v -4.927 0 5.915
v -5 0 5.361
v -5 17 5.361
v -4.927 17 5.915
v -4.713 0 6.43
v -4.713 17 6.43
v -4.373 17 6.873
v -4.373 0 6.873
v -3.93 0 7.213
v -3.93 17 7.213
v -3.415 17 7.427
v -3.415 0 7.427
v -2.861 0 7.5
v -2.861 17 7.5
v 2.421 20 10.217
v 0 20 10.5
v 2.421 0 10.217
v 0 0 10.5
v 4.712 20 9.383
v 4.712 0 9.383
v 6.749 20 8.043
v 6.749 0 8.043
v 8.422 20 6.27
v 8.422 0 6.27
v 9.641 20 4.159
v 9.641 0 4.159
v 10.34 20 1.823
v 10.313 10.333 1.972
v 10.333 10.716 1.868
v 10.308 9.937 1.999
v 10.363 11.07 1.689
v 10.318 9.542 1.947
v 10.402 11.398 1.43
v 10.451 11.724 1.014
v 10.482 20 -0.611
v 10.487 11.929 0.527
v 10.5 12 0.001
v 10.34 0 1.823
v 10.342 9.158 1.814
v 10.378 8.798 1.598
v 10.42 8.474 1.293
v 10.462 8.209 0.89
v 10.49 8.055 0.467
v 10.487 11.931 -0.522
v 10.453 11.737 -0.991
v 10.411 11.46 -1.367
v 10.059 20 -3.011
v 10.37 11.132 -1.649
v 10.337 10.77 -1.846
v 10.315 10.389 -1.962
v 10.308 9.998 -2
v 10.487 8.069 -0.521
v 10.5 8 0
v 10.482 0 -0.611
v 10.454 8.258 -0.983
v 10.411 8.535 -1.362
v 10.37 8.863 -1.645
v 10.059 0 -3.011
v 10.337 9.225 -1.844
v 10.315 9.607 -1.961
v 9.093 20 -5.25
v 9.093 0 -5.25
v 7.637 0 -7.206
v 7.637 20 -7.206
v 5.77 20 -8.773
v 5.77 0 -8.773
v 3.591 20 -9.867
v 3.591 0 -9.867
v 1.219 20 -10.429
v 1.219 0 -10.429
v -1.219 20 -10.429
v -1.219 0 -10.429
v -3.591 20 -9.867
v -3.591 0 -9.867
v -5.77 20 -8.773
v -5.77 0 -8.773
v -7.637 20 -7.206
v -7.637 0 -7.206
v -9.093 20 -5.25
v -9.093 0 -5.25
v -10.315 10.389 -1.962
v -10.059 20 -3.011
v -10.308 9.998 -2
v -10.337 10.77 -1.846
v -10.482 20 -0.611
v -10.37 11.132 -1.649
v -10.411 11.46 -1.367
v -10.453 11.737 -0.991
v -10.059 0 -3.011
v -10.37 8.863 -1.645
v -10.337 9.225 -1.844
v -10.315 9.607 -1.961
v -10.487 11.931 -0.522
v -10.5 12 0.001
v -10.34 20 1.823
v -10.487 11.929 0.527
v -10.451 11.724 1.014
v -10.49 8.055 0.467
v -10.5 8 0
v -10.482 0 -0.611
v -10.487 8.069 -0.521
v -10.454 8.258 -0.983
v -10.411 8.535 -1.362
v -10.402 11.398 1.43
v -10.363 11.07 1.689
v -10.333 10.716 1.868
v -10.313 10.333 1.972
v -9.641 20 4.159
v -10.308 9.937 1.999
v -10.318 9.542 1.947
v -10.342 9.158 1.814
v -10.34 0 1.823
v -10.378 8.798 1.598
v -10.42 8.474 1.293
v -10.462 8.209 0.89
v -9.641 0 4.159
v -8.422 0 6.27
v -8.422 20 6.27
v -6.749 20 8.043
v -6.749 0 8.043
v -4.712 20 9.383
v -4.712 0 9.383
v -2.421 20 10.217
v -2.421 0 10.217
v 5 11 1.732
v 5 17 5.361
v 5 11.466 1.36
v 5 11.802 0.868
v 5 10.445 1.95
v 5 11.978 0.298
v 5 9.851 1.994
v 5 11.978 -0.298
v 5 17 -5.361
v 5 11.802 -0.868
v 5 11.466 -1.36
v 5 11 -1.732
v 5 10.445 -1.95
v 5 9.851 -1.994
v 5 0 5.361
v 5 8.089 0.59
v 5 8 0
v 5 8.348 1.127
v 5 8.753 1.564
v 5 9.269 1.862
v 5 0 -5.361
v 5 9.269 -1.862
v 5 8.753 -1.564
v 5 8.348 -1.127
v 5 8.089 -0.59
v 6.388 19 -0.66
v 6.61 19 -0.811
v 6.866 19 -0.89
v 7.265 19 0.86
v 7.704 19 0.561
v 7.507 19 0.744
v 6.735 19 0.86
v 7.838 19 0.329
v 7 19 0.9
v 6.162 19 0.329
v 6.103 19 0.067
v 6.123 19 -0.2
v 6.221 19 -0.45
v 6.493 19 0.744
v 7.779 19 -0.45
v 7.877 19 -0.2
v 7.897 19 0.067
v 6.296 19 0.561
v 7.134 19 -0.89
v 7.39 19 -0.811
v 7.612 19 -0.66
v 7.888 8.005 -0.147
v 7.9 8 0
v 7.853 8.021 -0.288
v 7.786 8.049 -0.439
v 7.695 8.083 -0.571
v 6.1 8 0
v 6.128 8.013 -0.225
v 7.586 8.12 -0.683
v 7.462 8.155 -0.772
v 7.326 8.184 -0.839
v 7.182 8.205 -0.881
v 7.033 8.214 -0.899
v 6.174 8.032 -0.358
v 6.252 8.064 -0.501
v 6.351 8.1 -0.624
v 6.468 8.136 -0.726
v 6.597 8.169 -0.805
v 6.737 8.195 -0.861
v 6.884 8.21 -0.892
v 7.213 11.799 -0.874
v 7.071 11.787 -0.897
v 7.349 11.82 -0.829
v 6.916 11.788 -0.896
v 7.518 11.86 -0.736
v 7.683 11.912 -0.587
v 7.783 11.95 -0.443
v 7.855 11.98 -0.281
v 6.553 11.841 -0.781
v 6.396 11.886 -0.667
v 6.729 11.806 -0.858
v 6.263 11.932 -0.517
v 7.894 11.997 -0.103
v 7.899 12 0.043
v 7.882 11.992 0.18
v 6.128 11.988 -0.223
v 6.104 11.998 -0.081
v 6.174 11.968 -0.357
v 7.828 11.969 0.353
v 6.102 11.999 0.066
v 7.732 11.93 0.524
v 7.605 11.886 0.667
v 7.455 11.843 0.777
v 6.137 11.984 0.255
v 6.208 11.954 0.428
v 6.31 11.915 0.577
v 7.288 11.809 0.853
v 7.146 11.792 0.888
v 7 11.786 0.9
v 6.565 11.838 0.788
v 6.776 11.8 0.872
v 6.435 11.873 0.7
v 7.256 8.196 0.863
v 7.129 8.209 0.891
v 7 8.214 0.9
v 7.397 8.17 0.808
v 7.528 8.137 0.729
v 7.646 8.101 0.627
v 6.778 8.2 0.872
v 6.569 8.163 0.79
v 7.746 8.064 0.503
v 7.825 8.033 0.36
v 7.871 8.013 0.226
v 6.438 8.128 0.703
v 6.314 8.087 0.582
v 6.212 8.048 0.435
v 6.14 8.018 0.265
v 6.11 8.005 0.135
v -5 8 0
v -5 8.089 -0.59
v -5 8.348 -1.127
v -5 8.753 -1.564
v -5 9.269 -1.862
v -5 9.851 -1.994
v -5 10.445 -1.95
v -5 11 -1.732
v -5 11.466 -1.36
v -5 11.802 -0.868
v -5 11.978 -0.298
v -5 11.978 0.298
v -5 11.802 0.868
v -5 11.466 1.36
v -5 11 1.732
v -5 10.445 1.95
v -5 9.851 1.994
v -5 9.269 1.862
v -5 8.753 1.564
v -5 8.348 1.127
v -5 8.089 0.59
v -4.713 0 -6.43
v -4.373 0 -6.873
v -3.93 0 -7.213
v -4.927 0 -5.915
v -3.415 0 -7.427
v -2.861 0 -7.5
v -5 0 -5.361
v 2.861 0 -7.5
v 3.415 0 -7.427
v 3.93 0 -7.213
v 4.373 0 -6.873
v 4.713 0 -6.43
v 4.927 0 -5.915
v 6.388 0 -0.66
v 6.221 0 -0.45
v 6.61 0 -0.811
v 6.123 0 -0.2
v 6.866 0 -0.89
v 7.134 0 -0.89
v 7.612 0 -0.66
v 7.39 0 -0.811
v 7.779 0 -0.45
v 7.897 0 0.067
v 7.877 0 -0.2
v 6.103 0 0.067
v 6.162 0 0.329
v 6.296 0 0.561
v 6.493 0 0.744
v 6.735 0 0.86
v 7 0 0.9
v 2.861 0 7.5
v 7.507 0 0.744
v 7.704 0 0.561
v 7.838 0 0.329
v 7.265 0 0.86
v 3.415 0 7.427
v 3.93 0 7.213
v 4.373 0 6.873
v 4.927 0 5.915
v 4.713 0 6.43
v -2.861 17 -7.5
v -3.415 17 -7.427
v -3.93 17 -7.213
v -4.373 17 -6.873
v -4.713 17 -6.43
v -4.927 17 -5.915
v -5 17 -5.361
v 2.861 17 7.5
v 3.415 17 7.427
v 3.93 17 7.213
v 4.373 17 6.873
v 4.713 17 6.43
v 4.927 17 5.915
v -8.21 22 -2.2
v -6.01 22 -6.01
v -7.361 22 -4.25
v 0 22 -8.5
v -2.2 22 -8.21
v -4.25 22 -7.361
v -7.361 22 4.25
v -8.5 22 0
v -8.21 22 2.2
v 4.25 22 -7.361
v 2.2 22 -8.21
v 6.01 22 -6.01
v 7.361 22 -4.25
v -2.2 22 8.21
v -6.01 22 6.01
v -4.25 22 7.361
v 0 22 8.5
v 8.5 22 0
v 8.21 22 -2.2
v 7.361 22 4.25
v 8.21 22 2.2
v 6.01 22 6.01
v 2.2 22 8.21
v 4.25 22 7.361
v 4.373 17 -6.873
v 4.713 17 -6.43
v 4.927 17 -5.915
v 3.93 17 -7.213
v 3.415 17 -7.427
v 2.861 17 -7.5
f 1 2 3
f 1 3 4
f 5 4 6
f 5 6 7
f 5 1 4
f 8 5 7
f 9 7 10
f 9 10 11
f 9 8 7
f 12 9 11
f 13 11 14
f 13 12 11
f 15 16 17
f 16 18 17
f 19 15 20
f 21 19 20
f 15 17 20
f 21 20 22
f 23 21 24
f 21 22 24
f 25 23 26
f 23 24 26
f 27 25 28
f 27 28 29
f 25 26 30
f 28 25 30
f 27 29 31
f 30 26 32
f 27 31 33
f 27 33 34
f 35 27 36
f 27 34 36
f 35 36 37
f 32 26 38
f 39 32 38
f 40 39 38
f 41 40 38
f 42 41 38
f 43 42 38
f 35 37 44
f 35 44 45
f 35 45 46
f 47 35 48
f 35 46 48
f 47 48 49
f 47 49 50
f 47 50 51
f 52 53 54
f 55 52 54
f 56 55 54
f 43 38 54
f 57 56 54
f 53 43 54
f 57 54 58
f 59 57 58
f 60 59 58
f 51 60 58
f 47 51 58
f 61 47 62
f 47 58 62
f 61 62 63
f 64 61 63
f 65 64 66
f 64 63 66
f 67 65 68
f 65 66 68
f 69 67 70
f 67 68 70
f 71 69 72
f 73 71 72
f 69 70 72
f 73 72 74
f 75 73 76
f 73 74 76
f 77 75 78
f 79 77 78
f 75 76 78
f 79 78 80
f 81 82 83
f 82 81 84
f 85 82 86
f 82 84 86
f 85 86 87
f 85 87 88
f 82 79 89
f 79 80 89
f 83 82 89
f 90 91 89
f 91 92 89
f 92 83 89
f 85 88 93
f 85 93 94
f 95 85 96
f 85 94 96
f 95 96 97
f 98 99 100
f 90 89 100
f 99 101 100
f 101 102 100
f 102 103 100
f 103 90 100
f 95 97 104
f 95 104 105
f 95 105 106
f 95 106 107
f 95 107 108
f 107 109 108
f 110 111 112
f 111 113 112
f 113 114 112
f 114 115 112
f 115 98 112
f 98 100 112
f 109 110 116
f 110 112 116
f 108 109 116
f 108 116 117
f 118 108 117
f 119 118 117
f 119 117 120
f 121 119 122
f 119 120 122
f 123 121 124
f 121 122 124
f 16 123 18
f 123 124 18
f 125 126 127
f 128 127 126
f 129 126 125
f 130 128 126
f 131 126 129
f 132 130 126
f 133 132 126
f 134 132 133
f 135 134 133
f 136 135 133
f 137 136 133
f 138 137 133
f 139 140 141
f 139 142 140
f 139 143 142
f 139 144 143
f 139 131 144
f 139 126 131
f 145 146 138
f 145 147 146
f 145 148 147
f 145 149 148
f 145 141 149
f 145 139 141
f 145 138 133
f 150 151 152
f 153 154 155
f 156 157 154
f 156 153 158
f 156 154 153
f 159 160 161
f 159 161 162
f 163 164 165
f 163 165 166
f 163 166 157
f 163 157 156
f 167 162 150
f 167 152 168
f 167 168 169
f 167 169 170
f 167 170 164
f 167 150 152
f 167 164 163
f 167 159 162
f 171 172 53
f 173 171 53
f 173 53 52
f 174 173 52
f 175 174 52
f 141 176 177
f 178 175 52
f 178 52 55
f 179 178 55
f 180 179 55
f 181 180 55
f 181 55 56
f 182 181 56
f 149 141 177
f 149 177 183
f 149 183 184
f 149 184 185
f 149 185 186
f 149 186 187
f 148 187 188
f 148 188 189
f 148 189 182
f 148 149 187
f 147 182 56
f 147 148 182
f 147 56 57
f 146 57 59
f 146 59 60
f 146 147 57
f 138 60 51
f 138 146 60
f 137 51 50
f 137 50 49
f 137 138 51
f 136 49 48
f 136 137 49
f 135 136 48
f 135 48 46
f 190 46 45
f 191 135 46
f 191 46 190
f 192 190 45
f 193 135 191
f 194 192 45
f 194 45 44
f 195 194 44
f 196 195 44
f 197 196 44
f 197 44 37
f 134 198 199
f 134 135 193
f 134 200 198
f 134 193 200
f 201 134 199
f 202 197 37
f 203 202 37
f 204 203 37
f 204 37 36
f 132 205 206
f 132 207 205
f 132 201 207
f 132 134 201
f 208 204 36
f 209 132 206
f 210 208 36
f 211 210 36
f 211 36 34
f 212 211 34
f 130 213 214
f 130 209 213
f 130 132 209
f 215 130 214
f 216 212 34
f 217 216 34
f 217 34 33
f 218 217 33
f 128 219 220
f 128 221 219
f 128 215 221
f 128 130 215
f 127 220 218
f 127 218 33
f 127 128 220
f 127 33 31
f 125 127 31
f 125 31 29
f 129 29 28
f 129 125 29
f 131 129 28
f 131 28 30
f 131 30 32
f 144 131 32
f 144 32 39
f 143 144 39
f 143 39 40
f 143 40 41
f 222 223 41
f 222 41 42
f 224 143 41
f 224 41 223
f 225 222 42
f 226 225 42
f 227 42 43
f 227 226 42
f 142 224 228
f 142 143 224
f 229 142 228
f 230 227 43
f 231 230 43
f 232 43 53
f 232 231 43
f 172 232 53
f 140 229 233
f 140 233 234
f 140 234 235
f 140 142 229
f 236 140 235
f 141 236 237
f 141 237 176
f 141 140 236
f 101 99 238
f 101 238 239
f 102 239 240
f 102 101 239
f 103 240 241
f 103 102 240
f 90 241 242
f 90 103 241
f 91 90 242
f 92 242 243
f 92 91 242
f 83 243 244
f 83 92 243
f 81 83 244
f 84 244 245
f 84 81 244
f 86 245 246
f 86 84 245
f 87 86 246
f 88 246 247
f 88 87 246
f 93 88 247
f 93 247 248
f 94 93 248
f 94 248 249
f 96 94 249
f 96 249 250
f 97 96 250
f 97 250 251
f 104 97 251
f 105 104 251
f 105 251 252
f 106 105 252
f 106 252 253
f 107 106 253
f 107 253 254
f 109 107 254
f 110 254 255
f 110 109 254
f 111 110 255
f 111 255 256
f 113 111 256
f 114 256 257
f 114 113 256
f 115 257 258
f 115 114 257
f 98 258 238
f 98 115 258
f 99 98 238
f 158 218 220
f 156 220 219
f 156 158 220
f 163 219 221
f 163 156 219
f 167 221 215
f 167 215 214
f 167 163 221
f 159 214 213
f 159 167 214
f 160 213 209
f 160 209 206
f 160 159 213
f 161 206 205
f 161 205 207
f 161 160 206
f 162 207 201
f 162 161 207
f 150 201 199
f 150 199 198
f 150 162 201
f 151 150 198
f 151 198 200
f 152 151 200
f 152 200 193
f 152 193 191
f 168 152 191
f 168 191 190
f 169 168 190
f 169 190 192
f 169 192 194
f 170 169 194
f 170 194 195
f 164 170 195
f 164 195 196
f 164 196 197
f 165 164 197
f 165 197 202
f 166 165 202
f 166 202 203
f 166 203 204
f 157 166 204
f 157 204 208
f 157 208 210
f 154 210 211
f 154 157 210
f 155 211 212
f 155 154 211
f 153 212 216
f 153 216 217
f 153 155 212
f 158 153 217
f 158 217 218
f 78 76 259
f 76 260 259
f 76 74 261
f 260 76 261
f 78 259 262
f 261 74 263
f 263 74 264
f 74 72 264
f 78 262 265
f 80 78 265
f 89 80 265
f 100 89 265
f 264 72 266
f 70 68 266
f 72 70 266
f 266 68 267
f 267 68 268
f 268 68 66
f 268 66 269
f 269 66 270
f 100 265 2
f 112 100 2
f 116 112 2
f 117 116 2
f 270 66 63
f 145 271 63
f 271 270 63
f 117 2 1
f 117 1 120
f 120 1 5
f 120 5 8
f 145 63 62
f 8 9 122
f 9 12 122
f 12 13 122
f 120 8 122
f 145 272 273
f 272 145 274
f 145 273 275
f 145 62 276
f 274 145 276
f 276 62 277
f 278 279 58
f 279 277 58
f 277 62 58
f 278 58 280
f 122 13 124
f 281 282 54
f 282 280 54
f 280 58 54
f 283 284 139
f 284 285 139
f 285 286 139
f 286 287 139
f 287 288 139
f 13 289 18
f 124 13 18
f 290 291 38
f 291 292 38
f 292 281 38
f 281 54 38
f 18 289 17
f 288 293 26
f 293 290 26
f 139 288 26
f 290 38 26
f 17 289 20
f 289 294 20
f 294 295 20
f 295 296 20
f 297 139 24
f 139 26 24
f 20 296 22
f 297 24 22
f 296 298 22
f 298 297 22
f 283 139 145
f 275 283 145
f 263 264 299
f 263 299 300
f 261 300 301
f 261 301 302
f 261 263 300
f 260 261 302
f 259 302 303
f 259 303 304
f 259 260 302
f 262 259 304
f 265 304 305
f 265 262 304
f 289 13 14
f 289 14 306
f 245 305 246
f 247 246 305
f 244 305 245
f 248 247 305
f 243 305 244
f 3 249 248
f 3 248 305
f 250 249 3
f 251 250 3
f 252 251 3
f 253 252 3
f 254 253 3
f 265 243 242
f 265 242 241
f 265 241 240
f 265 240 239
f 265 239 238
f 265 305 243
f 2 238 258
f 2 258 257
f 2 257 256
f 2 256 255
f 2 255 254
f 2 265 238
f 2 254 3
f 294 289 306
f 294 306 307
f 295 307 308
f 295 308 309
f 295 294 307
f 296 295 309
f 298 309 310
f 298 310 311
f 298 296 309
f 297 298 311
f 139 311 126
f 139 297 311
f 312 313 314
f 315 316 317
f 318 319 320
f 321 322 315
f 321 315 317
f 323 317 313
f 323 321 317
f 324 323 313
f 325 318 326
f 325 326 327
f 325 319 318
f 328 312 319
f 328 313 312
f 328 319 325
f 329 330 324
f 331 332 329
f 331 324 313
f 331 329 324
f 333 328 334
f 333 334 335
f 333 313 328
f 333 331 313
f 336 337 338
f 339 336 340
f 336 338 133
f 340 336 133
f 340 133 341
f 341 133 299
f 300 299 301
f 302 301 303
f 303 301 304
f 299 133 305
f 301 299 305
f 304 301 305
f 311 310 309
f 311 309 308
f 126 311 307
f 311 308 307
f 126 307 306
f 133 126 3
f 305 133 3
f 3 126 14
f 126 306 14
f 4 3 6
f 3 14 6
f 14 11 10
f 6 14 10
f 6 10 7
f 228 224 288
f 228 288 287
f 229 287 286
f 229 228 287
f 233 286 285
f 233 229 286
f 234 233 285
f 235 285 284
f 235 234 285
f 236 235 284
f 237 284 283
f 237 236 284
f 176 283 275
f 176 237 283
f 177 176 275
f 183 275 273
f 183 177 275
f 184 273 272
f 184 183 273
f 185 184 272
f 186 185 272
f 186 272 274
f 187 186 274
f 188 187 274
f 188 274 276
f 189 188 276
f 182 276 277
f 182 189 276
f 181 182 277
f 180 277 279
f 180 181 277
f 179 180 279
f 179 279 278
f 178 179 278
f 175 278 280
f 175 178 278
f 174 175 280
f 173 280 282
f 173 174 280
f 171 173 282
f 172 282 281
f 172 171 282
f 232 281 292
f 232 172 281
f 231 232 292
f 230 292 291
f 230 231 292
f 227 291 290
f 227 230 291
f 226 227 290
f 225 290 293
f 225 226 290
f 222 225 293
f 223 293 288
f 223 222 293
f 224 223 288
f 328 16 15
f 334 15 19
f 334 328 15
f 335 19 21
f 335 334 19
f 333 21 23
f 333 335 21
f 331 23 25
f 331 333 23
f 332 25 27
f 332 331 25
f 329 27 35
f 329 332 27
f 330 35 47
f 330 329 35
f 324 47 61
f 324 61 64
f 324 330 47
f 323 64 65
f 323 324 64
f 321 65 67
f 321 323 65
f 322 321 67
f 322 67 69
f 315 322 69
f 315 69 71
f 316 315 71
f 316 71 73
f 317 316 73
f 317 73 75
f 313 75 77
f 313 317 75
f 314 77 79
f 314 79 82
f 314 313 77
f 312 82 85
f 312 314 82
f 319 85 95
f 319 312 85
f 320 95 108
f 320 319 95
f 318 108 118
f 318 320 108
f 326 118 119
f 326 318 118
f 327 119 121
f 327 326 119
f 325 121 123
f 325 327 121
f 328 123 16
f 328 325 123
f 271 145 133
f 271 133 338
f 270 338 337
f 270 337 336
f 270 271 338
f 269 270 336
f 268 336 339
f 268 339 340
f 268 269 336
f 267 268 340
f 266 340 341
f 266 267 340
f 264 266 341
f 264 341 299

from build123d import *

# Parameters (mm, degrees)
SCHIZZO2_R                    = 10.5
ESTRUSIONE_ESTRUSIONE1_DEPTH  = 22
TAGLIO_ESTRUSIONE1_DEPTH      = 17
SMUSSO1_SIZE                  = 2
TAGLIO_ESTRUSIONE2_DEPTH      = 27.54241888
TAGLIO_ESTRUSIONE2_DEPTH_BACK = 27.54241888
SCHIZZO4_R                    = 2
TAGLIO_ESTRUSIONE3_DEPTH      = 27.542418959
TAGLIO_ESTRUSIONE3_DEPTH_BACK = 19
SCHIZZO5_R                    = 0.9


with BuildPart() as part:
    # Schizzo2 → Estrusione-Estrusione1 (new body)
    with BuildSketch(Plane(origin=(0, 0, 0), x_dir=(1, 0, 0), z_dir=(0, 1, 0))):
        with Locations(Location((0, 0, 0), (0, 0, 270))):
            Circle(SCHIZZO2_R)
    extrude(amount=ESTRUSIONE_ESTRUSIONE1_DEPTH)

    # Schizzo3 → Taglio-Estrusione1 (cut)
    with BuildSketch(Plane.XZ):
        with BuildLine():
            Line((-2.860934268, 7.5), (2.860934268, 7.5))
            ThreePointArc((2.860934268, 7.5), (4.373482153, 6.873482153), (5, 5.360934268))
            Line((5, 5.360934268), (5, -5.360934268))
            ThreePointArc((5, -5.360934268), (4.373482153, -6.873482153), (2.860934268, -7.5))
            Line((2.860934268, -7.5), (-2.860934268, -7.5))
            ThreePointArc((-2.860934268, -7.5), (-4.373482153, -6.873482153), (-5, -5.360934268))
            Line((-5, -5.360934268), (-5, 5.360934268))
            ThreePointArc((-5, 5.360934268), (-4.373482153, 6.873482153), (-2.860934268, 7.5))
        make_face()
    extrude(amount=-TAGLIO_ESTRUSIONE1_DEPTH, mode=Mode.SUBTRACT)

    # Smusso1
    smusso1_edges = [part.edges().sort_by_distance(p)[0] for p in [
        (0, 22, -10.5),
    ]]
    chamfer(smusso1_edges, length=SMUSSO1_SIZE)

    # Schizzo4 → Taglio-Estrusione2 (cut, two sides: drawn at the far end of the back side and taken through both)
    with BuildSketch(Plane(origin=(0, 0, 0), x_dir=(0, 0, -1), z_dir=(1, 0, 0)).offset(-TAGLIO_ESTRUSIONE2_DEPTH_BACK)):
        with Locations(Location((0, 10, 0), (0, 0, 270))):
            Circle(SCHIZZO4_R)
    extrude(amount=TAGLIO_ESTRUSIONE2_DEPTH + TAGLIO_ESTRUSIONE2_DEPTH_BACK, mode=Mode.SUBTRACT)

    # Schizzo5 → Taglio-Estrusione3 (cut, two sides: drawn at the far end of the back side and taken through both)
    with BuildSketch(Plane.XZ.offset(-TAGLIO_ESTRUSIONE3_DEPTH_BACK)):
        with Locations(Location((7, 0, 0), (0, 0, 90))):
            Circle(SCHIZZO5_R)
    extrude(amount=TAGLIO_ESTRUSIONE3_DEPTH + TAGLIO_ESTRUSIONE3_DEPTH_BACK, mode=Mode.SUBTRACT)


solid = part.part
